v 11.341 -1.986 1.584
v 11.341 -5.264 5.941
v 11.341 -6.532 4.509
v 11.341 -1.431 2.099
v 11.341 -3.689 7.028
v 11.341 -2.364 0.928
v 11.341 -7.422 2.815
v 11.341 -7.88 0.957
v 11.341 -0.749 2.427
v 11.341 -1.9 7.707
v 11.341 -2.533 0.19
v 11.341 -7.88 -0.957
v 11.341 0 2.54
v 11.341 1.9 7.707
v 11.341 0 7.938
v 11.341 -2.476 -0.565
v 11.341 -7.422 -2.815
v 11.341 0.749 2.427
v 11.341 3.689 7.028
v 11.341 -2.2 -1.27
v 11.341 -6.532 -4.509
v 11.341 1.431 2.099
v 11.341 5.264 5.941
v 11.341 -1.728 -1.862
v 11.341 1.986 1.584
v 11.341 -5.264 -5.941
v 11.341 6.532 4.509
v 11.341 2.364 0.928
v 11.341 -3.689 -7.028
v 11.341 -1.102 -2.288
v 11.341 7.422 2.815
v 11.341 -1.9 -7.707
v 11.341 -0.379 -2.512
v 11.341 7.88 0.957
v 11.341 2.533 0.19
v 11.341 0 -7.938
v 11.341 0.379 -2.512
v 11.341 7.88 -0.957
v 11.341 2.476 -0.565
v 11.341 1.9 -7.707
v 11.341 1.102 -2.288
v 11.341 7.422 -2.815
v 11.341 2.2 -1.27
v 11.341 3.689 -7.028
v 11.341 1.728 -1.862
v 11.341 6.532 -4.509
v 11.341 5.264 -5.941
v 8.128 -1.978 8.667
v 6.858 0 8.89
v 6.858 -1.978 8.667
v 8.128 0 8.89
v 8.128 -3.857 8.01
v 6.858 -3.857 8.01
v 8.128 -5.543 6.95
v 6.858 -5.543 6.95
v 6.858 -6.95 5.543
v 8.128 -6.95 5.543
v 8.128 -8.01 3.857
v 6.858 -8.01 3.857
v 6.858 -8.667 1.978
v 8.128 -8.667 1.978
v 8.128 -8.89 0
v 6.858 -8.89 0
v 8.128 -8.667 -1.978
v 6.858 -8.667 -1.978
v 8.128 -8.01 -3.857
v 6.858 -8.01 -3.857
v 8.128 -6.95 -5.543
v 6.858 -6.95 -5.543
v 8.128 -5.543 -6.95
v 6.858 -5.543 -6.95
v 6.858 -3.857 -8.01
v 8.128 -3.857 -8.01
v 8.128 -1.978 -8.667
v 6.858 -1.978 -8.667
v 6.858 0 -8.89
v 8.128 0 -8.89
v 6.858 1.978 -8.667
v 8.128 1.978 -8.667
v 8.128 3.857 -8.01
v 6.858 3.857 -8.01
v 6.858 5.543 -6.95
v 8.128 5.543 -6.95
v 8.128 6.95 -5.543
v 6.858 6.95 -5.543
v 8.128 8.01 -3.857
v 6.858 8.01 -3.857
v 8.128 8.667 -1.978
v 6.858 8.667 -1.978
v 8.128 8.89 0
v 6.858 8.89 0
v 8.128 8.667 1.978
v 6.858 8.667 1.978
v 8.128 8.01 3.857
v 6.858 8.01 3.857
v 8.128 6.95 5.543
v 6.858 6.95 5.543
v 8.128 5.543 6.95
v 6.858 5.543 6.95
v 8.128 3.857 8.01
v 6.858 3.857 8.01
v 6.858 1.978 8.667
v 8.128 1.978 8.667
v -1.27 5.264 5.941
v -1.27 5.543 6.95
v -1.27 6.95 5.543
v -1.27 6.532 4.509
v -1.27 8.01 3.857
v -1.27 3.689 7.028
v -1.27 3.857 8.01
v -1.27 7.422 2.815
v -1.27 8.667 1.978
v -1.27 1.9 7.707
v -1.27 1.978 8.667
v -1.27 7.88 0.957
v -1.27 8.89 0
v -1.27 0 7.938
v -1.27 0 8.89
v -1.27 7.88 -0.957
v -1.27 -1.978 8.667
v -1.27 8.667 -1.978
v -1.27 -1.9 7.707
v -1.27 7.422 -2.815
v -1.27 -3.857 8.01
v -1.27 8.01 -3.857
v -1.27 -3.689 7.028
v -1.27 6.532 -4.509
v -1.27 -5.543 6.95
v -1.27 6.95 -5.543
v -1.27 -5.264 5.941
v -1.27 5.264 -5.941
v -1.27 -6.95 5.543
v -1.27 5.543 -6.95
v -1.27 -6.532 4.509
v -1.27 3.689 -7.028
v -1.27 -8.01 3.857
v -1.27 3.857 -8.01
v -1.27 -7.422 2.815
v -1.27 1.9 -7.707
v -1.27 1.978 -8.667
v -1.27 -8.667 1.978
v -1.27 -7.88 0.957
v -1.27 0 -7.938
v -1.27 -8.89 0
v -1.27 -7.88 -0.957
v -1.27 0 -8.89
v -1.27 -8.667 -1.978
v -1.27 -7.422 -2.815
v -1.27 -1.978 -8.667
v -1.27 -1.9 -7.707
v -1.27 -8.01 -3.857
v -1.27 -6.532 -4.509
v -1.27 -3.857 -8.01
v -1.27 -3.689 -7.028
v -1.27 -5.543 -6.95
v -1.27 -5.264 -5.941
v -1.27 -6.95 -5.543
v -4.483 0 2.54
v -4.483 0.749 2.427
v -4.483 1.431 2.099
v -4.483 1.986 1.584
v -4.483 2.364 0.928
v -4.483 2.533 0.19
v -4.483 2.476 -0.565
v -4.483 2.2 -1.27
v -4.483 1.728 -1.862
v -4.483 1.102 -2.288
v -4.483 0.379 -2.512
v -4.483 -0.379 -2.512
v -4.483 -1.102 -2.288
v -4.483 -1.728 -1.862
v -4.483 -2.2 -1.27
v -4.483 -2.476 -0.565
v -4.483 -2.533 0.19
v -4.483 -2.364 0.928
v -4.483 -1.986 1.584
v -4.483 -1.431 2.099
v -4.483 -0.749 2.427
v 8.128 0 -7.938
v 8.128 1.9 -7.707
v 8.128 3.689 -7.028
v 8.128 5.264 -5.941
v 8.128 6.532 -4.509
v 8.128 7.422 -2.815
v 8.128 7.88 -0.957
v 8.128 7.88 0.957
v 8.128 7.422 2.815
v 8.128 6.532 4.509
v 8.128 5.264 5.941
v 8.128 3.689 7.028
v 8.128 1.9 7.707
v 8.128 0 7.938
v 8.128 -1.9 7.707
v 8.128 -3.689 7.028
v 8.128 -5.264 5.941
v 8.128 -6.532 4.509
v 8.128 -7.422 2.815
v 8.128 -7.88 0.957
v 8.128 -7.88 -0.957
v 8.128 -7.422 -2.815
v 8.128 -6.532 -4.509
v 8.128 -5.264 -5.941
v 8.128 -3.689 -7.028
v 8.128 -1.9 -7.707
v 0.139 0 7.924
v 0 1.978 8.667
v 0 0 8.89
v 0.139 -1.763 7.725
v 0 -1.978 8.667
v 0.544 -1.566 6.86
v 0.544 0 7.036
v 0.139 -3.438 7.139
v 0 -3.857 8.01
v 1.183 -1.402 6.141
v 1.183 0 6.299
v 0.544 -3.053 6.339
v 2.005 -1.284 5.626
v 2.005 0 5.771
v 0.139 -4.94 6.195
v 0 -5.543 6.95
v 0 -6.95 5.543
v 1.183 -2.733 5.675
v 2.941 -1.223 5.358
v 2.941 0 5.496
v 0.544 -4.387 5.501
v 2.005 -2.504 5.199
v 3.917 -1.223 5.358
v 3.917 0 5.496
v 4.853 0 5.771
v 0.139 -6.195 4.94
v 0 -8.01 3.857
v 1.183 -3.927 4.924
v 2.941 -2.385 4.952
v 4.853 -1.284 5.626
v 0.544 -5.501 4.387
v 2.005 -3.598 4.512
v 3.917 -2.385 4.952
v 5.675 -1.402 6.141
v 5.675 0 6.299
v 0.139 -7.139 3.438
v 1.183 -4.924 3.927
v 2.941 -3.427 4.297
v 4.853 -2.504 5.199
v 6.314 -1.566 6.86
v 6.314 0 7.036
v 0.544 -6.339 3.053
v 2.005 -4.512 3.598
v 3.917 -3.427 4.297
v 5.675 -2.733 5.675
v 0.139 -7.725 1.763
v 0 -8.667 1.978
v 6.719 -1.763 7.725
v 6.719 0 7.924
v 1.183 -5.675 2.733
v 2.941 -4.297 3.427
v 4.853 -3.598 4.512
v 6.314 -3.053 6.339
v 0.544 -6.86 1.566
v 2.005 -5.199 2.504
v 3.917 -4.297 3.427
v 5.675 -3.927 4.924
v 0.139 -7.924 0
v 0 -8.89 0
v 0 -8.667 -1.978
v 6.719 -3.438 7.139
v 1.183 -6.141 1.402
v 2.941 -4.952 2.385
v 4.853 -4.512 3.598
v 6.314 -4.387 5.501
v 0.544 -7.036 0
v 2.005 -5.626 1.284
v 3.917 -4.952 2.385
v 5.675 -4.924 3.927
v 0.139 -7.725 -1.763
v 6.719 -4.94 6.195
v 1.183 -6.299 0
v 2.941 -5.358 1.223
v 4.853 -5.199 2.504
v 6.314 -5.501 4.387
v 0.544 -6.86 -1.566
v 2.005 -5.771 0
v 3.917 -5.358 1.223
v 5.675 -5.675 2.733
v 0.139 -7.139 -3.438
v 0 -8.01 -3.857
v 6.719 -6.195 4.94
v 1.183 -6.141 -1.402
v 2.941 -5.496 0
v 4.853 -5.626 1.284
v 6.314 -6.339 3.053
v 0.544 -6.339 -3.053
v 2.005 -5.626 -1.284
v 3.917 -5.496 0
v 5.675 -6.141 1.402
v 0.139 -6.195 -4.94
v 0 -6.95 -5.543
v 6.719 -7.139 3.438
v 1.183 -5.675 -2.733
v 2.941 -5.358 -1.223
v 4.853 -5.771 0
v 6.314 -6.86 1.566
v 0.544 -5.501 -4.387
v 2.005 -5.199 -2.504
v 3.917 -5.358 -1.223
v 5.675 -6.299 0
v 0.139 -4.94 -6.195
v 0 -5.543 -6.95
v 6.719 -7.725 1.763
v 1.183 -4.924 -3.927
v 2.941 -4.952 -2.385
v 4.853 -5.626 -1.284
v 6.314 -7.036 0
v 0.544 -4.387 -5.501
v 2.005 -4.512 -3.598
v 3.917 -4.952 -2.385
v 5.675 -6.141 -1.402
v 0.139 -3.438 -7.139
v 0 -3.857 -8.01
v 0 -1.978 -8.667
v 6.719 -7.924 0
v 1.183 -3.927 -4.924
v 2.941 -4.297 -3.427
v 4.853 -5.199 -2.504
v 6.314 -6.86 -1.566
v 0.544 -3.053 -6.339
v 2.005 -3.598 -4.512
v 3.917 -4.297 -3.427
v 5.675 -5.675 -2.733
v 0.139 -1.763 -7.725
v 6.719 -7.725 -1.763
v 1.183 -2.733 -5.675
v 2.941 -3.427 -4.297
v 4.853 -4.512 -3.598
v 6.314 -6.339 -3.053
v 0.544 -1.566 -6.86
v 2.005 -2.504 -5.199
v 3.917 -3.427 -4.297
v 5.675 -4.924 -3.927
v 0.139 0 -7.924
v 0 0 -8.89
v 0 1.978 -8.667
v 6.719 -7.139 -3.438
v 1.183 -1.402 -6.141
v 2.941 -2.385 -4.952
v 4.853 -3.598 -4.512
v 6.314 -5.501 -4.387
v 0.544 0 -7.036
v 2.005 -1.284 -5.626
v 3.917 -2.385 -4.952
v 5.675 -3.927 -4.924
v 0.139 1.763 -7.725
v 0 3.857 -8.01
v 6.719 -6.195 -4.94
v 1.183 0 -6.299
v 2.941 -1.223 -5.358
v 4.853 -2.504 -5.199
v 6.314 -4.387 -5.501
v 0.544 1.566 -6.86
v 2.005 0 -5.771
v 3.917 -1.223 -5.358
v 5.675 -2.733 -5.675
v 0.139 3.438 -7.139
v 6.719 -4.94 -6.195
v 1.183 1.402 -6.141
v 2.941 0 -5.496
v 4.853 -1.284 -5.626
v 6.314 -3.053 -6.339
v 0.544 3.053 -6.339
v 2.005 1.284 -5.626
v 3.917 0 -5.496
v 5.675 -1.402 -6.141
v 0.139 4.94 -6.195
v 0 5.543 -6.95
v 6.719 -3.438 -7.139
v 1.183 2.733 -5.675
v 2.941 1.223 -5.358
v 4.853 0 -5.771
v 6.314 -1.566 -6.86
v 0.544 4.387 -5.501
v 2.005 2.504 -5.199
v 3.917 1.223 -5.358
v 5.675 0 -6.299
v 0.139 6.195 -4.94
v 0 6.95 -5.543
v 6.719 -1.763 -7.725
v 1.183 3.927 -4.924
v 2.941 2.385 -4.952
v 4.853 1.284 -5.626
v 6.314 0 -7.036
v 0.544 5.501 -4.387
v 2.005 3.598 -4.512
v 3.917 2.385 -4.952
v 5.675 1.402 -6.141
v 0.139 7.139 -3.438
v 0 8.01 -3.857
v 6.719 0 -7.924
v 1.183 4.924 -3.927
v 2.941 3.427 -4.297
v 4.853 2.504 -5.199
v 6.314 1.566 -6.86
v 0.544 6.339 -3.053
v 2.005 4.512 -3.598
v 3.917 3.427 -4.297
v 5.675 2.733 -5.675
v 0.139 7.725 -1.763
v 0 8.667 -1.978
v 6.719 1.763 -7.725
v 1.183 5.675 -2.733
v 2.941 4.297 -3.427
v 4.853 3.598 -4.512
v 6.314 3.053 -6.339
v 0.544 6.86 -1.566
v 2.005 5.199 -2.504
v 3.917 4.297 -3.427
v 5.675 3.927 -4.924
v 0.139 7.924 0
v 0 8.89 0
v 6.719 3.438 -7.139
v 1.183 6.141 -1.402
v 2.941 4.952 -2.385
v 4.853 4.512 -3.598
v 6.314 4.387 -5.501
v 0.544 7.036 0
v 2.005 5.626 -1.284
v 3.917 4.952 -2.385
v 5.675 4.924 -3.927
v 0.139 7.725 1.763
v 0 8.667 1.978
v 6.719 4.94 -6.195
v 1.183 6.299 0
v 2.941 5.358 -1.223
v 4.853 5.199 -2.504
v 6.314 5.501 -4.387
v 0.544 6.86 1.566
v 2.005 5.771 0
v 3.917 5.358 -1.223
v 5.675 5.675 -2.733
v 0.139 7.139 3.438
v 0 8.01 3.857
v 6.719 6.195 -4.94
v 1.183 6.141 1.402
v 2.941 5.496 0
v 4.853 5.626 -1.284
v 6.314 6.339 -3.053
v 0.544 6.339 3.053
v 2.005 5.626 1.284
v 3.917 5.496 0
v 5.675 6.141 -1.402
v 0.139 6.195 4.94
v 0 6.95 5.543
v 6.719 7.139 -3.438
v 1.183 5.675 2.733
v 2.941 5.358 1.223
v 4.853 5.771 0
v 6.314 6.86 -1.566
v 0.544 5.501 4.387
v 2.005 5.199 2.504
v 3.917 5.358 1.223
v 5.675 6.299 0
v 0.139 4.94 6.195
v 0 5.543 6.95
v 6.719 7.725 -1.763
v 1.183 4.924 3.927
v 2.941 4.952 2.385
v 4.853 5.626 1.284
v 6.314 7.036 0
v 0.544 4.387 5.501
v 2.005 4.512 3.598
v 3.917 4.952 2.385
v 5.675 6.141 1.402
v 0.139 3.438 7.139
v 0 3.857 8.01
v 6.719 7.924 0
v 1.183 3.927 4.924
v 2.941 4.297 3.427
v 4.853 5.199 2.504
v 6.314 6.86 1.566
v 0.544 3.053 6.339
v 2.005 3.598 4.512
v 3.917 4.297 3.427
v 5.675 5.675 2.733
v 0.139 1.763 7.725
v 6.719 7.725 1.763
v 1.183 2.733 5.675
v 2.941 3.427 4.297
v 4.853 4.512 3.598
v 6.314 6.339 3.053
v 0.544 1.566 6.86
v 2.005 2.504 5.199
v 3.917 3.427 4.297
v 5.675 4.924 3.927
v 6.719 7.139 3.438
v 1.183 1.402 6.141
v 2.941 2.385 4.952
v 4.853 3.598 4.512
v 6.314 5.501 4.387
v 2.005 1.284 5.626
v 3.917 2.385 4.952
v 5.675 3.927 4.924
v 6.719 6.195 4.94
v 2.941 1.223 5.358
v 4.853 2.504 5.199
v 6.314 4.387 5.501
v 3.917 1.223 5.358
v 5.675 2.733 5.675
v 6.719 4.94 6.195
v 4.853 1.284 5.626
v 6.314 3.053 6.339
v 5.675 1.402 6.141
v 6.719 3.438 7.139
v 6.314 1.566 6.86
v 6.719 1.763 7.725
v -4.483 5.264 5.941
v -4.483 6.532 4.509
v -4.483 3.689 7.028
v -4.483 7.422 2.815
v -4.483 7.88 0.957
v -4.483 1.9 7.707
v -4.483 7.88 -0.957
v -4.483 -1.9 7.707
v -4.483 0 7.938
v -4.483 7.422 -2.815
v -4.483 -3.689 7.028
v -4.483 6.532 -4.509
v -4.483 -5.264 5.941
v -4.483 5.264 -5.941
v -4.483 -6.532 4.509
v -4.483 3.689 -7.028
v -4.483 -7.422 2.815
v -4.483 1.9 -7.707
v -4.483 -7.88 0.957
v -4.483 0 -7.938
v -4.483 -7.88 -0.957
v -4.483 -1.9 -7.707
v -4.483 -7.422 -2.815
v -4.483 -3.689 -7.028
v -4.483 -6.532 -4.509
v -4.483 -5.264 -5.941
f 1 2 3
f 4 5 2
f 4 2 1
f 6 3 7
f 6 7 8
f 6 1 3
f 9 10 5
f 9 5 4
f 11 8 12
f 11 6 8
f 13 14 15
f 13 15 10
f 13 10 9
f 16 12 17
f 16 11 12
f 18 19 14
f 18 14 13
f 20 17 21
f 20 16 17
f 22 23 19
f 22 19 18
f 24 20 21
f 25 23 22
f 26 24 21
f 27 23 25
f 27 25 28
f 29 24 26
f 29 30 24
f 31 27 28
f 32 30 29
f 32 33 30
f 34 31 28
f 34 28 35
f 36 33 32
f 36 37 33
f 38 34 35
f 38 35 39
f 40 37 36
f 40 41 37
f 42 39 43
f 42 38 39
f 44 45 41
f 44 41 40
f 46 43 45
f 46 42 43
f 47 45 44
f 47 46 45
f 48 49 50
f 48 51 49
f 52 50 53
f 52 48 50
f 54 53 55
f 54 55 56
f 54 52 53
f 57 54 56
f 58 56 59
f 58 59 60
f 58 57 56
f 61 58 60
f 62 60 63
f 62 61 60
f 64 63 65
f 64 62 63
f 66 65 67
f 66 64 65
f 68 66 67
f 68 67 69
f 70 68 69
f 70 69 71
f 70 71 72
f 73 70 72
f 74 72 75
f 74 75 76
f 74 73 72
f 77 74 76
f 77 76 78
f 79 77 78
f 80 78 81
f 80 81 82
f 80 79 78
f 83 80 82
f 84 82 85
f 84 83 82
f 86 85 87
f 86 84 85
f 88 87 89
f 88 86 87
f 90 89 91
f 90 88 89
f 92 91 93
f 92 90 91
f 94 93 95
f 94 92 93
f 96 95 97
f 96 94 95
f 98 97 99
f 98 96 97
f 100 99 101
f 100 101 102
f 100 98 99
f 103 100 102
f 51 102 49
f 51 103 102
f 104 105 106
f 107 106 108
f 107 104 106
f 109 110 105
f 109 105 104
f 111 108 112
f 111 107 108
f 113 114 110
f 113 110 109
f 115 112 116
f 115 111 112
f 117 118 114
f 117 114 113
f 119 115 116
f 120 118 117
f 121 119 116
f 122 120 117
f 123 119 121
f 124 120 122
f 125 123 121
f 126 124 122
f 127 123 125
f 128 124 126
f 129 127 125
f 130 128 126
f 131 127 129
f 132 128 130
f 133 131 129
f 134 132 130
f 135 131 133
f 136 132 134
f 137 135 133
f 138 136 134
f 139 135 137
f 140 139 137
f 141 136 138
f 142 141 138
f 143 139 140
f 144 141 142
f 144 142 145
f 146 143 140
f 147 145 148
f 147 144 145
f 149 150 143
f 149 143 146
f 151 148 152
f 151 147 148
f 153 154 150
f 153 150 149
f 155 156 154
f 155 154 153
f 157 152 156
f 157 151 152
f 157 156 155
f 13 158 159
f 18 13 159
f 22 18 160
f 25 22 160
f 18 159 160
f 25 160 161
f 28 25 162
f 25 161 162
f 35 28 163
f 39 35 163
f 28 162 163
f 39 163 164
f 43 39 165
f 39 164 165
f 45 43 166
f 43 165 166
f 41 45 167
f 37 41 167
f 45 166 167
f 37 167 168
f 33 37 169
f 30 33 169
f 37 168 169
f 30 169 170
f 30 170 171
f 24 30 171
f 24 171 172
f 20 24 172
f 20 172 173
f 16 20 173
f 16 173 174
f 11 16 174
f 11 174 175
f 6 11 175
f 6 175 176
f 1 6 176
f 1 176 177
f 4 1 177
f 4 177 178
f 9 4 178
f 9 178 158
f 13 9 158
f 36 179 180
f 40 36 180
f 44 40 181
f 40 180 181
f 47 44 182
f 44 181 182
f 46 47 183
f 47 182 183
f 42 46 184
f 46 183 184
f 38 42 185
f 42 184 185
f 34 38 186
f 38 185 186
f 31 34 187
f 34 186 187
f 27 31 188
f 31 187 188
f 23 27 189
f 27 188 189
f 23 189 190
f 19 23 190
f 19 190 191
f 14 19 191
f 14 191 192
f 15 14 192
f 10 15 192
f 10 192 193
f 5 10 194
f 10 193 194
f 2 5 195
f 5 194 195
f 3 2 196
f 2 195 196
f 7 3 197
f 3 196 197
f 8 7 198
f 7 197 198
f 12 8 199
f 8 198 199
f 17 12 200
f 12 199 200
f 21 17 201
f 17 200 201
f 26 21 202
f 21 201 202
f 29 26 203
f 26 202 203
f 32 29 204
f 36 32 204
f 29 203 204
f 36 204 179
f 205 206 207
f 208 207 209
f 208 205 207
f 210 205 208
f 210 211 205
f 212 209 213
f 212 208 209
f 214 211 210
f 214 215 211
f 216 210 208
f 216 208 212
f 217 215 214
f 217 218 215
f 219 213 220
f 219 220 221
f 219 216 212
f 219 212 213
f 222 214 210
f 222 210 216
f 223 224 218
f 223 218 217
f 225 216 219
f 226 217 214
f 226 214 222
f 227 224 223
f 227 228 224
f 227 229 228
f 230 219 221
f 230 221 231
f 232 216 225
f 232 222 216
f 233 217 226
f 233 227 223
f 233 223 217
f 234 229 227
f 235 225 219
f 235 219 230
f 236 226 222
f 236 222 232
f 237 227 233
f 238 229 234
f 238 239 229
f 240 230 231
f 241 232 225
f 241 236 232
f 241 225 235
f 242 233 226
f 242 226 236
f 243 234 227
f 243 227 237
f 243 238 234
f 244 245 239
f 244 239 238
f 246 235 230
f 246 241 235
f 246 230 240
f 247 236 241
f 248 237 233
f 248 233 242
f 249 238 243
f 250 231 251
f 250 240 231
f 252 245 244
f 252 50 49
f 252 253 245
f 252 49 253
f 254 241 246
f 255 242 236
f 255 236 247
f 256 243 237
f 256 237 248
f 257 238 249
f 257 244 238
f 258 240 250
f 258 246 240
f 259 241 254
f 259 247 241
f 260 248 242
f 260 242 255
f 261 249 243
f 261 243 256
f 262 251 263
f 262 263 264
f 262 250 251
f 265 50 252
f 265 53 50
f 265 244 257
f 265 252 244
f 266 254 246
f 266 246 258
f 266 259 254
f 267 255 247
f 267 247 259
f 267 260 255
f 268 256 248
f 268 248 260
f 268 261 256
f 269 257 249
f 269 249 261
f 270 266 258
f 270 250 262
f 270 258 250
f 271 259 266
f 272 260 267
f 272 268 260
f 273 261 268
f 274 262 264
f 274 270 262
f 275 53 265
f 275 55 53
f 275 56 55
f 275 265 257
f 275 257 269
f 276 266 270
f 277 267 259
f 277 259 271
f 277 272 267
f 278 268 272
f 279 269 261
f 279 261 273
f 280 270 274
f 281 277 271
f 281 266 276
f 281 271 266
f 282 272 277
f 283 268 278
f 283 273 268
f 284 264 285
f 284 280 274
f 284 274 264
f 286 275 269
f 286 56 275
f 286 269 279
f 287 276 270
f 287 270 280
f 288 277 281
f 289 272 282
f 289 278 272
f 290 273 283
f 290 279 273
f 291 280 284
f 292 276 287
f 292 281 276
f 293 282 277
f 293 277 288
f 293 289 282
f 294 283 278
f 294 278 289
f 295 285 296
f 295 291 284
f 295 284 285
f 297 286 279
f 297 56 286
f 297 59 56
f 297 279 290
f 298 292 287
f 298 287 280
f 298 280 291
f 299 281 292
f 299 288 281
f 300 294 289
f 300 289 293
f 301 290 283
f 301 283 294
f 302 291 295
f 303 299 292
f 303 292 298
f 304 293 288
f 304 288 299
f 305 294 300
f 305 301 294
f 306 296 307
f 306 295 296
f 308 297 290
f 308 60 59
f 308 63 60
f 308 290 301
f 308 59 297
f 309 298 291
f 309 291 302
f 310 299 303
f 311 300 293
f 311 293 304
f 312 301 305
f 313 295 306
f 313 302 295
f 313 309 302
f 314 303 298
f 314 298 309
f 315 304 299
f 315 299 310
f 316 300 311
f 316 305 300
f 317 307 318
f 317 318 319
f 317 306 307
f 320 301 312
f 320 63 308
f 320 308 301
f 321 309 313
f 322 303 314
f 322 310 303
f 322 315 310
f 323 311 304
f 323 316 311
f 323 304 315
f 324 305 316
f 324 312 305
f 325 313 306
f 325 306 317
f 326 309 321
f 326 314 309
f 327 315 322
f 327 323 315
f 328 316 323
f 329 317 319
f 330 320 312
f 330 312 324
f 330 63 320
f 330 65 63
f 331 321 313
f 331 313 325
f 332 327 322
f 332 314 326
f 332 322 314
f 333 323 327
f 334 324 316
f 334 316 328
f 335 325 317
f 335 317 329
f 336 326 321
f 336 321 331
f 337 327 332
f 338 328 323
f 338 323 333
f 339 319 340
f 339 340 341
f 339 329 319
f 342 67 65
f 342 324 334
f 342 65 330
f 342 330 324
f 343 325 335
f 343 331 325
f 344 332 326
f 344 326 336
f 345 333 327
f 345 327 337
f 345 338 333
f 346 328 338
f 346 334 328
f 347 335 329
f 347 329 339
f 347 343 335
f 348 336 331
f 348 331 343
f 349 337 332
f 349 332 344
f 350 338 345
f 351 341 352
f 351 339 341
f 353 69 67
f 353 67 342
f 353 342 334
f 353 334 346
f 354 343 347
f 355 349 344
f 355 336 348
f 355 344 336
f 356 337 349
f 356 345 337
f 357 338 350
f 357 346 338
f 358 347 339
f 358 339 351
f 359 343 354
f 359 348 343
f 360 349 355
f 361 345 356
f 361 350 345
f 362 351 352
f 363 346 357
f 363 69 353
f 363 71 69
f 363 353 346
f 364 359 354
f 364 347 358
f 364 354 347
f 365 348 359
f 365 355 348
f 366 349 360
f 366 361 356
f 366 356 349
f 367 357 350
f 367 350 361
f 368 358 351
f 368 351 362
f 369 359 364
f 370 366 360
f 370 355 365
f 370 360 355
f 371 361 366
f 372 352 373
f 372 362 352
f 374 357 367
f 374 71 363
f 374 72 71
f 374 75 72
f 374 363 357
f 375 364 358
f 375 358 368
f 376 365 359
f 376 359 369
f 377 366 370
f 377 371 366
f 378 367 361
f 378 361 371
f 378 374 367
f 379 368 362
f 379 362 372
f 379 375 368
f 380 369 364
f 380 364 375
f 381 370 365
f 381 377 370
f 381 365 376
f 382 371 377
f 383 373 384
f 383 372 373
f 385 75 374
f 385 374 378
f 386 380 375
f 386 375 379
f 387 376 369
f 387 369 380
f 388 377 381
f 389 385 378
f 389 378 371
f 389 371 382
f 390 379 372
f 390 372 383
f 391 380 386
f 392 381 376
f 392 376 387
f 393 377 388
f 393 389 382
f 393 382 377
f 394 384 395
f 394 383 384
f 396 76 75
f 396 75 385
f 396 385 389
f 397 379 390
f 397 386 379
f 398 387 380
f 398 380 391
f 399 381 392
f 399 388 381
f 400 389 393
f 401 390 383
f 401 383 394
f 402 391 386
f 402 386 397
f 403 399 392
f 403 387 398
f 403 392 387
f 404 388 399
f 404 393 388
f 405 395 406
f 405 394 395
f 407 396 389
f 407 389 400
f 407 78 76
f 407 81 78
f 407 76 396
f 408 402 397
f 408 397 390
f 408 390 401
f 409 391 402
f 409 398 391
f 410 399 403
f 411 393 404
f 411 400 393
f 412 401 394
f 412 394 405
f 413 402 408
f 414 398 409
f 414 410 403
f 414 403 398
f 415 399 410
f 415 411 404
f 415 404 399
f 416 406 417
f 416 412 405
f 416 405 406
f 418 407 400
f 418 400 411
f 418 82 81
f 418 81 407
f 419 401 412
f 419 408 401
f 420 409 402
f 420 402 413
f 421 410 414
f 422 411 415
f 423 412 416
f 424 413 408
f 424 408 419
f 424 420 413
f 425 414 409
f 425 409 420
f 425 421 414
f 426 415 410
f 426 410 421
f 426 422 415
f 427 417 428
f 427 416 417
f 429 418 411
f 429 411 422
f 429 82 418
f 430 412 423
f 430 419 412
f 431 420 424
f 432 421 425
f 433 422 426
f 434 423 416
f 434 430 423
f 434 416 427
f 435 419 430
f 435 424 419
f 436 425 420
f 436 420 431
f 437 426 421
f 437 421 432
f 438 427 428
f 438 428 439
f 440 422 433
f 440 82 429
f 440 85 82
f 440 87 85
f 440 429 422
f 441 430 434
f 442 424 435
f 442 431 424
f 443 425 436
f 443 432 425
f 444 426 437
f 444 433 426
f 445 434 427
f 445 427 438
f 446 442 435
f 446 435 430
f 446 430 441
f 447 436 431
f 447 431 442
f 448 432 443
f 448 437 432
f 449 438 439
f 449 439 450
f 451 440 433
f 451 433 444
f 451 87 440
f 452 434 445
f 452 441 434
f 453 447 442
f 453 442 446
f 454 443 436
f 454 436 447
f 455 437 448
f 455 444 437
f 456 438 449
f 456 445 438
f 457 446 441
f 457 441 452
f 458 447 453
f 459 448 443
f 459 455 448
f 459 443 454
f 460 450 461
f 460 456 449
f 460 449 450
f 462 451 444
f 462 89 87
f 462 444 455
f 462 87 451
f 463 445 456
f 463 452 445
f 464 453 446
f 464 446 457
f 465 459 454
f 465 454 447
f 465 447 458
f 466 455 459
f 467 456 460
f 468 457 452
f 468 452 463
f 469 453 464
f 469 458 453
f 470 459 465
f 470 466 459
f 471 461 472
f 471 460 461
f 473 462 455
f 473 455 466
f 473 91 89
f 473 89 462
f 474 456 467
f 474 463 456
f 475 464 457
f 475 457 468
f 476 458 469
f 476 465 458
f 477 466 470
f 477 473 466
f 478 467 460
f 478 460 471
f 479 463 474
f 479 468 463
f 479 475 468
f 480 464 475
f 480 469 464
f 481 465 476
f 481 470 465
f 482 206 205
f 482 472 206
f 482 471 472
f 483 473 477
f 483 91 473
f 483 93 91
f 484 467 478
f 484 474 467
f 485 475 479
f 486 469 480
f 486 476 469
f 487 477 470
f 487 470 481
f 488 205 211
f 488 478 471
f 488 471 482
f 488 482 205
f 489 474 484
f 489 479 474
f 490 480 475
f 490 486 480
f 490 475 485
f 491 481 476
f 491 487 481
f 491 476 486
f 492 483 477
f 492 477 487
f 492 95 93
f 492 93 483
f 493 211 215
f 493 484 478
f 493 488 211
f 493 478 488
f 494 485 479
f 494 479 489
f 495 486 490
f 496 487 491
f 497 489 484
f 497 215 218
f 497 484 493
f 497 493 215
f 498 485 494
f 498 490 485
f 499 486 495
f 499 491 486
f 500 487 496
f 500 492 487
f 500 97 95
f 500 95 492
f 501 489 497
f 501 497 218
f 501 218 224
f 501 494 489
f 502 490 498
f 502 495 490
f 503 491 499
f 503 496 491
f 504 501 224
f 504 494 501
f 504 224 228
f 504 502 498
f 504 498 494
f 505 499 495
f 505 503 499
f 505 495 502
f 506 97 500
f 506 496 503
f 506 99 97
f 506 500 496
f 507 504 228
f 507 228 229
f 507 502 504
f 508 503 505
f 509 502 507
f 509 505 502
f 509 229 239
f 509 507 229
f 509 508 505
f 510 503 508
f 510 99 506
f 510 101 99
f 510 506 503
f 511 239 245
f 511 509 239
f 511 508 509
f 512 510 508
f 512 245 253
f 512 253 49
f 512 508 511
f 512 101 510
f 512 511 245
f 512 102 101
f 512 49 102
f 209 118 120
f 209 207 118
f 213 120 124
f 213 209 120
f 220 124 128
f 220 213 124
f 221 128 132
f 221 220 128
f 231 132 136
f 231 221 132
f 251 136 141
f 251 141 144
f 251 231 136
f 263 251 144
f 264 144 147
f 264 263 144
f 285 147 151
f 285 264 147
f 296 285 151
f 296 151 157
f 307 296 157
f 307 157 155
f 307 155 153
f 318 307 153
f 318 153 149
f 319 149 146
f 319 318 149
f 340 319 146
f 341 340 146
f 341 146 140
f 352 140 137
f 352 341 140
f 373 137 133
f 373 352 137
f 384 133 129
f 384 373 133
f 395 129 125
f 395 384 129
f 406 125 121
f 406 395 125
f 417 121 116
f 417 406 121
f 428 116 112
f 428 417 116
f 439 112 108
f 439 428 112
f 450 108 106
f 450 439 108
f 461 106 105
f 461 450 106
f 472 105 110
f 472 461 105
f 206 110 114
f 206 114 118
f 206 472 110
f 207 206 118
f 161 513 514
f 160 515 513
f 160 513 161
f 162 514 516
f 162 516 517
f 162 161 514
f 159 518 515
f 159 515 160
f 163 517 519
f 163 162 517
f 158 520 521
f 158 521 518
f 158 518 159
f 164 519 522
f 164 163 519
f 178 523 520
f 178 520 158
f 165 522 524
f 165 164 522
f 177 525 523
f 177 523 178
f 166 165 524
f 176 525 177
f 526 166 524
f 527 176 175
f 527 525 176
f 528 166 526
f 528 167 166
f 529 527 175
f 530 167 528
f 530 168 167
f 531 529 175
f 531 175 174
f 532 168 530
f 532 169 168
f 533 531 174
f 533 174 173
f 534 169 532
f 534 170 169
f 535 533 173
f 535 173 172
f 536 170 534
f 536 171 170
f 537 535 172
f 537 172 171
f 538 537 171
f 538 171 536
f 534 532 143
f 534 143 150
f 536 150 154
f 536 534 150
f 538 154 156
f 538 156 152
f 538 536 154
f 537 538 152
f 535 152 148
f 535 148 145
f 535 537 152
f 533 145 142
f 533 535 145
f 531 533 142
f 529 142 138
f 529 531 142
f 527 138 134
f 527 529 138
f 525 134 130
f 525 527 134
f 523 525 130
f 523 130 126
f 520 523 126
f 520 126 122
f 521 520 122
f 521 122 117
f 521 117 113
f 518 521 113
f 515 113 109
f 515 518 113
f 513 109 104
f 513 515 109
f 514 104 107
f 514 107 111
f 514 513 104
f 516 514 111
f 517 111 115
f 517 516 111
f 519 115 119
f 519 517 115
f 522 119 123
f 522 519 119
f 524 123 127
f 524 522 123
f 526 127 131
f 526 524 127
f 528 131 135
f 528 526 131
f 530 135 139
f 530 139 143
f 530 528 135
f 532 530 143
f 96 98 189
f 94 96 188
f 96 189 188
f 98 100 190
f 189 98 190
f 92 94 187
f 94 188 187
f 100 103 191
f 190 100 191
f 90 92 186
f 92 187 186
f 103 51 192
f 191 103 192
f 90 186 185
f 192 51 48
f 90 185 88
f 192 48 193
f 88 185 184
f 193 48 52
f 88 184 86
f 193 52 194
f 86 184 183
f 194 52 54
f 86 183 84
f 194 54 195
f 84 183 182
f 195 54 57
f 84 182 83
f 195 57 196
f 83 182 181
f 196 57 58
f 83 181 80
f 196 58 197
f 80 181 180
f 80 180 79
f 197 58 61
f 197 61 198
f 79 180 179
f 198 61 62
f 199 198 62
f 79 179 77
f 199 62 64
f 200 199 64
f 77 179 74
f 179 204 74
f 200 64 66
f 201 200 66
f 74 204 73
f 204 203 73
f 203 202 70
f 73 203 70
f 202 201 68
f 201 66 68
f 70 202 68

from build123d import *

# Parameters (mm, degrees)
SKETCH1_W           = 1.27
SKETCH1_H           = 8.89
SKETCH2_R           = 7.9375
BOSS_EXTRUDE1_DEPTH = 3.2131
BOSS_EXTRUDE2_START = 3.2131
SKETCH3_R           = 7.9375
BOSS_EXTRUDE2_DEPTH = 3.2131
SKETCH4_R           = 2.54
CUT_EXTRUDE1_DEPTH  = 21.210628532


with BuildPart() as part:
    # Sketch1 → Revolve1 (revolve)
    with BuildSketch(Plane.XY, mode=Mode.PRIVATE) as revolve1_sk:
        with BuildLine():
            ThreePointArc((0, 8.89), (3.429, 5.461), (6.858, 8.89))
            Line((6.858, 8.89), (6.858, 0))
            Line((6.858, 0), (0, 0))
            Line((0, 0), (0, 8.89))
        make_face()
        with Locations((-0.635, 4.445)):
            Rectangle(SKETCH1_W, SKETCH1_H)
        with Locations((7.493, 4.445)):
            Rectangle(SKETCH1_W, SKETCH1_H)
    revolve(revolve1_sk.sketch.rotate(Axis((0, 0, 0), (1, 0, 0)), 90), axis=Axis((0, 0, 0), (1, 0, 0)))

    # Sketch2 → Boss-Extrude1 (add)
    with BuildSketch(Plane(origin=(8.128, 0, 0), x_dir=(0, 0, -1), z_dir=(1, 0, 0))):
        Circle(SKETCH2_R)
    extrude(amount=BOSS_EXTRUDE1_DEPTH)

    # Sketch3 → Boss-Extrude2 (add)
    with BuildSketch(Plane.ZY.offset(1.27).offset(BOSS_EXTRUDE2_START)):
        with Locations(Location((0, 0, 0), (0, 0, 180))):
            Circle(SKETCH3_R)
    extrude(amount=-BOSS_EXTRUDE2_DEPTH)

    # Sketch4 → Cut-Extrude1 (cut, through all)
    with BuildSketch(Plane.ZY.offset(4.4831)):
        Circle(SKETCH4_R)
    extrude(amount=-CUT_EXTRUDE1_DEPTH, mode=Mode.SUBTRACT)


solid = part.part
